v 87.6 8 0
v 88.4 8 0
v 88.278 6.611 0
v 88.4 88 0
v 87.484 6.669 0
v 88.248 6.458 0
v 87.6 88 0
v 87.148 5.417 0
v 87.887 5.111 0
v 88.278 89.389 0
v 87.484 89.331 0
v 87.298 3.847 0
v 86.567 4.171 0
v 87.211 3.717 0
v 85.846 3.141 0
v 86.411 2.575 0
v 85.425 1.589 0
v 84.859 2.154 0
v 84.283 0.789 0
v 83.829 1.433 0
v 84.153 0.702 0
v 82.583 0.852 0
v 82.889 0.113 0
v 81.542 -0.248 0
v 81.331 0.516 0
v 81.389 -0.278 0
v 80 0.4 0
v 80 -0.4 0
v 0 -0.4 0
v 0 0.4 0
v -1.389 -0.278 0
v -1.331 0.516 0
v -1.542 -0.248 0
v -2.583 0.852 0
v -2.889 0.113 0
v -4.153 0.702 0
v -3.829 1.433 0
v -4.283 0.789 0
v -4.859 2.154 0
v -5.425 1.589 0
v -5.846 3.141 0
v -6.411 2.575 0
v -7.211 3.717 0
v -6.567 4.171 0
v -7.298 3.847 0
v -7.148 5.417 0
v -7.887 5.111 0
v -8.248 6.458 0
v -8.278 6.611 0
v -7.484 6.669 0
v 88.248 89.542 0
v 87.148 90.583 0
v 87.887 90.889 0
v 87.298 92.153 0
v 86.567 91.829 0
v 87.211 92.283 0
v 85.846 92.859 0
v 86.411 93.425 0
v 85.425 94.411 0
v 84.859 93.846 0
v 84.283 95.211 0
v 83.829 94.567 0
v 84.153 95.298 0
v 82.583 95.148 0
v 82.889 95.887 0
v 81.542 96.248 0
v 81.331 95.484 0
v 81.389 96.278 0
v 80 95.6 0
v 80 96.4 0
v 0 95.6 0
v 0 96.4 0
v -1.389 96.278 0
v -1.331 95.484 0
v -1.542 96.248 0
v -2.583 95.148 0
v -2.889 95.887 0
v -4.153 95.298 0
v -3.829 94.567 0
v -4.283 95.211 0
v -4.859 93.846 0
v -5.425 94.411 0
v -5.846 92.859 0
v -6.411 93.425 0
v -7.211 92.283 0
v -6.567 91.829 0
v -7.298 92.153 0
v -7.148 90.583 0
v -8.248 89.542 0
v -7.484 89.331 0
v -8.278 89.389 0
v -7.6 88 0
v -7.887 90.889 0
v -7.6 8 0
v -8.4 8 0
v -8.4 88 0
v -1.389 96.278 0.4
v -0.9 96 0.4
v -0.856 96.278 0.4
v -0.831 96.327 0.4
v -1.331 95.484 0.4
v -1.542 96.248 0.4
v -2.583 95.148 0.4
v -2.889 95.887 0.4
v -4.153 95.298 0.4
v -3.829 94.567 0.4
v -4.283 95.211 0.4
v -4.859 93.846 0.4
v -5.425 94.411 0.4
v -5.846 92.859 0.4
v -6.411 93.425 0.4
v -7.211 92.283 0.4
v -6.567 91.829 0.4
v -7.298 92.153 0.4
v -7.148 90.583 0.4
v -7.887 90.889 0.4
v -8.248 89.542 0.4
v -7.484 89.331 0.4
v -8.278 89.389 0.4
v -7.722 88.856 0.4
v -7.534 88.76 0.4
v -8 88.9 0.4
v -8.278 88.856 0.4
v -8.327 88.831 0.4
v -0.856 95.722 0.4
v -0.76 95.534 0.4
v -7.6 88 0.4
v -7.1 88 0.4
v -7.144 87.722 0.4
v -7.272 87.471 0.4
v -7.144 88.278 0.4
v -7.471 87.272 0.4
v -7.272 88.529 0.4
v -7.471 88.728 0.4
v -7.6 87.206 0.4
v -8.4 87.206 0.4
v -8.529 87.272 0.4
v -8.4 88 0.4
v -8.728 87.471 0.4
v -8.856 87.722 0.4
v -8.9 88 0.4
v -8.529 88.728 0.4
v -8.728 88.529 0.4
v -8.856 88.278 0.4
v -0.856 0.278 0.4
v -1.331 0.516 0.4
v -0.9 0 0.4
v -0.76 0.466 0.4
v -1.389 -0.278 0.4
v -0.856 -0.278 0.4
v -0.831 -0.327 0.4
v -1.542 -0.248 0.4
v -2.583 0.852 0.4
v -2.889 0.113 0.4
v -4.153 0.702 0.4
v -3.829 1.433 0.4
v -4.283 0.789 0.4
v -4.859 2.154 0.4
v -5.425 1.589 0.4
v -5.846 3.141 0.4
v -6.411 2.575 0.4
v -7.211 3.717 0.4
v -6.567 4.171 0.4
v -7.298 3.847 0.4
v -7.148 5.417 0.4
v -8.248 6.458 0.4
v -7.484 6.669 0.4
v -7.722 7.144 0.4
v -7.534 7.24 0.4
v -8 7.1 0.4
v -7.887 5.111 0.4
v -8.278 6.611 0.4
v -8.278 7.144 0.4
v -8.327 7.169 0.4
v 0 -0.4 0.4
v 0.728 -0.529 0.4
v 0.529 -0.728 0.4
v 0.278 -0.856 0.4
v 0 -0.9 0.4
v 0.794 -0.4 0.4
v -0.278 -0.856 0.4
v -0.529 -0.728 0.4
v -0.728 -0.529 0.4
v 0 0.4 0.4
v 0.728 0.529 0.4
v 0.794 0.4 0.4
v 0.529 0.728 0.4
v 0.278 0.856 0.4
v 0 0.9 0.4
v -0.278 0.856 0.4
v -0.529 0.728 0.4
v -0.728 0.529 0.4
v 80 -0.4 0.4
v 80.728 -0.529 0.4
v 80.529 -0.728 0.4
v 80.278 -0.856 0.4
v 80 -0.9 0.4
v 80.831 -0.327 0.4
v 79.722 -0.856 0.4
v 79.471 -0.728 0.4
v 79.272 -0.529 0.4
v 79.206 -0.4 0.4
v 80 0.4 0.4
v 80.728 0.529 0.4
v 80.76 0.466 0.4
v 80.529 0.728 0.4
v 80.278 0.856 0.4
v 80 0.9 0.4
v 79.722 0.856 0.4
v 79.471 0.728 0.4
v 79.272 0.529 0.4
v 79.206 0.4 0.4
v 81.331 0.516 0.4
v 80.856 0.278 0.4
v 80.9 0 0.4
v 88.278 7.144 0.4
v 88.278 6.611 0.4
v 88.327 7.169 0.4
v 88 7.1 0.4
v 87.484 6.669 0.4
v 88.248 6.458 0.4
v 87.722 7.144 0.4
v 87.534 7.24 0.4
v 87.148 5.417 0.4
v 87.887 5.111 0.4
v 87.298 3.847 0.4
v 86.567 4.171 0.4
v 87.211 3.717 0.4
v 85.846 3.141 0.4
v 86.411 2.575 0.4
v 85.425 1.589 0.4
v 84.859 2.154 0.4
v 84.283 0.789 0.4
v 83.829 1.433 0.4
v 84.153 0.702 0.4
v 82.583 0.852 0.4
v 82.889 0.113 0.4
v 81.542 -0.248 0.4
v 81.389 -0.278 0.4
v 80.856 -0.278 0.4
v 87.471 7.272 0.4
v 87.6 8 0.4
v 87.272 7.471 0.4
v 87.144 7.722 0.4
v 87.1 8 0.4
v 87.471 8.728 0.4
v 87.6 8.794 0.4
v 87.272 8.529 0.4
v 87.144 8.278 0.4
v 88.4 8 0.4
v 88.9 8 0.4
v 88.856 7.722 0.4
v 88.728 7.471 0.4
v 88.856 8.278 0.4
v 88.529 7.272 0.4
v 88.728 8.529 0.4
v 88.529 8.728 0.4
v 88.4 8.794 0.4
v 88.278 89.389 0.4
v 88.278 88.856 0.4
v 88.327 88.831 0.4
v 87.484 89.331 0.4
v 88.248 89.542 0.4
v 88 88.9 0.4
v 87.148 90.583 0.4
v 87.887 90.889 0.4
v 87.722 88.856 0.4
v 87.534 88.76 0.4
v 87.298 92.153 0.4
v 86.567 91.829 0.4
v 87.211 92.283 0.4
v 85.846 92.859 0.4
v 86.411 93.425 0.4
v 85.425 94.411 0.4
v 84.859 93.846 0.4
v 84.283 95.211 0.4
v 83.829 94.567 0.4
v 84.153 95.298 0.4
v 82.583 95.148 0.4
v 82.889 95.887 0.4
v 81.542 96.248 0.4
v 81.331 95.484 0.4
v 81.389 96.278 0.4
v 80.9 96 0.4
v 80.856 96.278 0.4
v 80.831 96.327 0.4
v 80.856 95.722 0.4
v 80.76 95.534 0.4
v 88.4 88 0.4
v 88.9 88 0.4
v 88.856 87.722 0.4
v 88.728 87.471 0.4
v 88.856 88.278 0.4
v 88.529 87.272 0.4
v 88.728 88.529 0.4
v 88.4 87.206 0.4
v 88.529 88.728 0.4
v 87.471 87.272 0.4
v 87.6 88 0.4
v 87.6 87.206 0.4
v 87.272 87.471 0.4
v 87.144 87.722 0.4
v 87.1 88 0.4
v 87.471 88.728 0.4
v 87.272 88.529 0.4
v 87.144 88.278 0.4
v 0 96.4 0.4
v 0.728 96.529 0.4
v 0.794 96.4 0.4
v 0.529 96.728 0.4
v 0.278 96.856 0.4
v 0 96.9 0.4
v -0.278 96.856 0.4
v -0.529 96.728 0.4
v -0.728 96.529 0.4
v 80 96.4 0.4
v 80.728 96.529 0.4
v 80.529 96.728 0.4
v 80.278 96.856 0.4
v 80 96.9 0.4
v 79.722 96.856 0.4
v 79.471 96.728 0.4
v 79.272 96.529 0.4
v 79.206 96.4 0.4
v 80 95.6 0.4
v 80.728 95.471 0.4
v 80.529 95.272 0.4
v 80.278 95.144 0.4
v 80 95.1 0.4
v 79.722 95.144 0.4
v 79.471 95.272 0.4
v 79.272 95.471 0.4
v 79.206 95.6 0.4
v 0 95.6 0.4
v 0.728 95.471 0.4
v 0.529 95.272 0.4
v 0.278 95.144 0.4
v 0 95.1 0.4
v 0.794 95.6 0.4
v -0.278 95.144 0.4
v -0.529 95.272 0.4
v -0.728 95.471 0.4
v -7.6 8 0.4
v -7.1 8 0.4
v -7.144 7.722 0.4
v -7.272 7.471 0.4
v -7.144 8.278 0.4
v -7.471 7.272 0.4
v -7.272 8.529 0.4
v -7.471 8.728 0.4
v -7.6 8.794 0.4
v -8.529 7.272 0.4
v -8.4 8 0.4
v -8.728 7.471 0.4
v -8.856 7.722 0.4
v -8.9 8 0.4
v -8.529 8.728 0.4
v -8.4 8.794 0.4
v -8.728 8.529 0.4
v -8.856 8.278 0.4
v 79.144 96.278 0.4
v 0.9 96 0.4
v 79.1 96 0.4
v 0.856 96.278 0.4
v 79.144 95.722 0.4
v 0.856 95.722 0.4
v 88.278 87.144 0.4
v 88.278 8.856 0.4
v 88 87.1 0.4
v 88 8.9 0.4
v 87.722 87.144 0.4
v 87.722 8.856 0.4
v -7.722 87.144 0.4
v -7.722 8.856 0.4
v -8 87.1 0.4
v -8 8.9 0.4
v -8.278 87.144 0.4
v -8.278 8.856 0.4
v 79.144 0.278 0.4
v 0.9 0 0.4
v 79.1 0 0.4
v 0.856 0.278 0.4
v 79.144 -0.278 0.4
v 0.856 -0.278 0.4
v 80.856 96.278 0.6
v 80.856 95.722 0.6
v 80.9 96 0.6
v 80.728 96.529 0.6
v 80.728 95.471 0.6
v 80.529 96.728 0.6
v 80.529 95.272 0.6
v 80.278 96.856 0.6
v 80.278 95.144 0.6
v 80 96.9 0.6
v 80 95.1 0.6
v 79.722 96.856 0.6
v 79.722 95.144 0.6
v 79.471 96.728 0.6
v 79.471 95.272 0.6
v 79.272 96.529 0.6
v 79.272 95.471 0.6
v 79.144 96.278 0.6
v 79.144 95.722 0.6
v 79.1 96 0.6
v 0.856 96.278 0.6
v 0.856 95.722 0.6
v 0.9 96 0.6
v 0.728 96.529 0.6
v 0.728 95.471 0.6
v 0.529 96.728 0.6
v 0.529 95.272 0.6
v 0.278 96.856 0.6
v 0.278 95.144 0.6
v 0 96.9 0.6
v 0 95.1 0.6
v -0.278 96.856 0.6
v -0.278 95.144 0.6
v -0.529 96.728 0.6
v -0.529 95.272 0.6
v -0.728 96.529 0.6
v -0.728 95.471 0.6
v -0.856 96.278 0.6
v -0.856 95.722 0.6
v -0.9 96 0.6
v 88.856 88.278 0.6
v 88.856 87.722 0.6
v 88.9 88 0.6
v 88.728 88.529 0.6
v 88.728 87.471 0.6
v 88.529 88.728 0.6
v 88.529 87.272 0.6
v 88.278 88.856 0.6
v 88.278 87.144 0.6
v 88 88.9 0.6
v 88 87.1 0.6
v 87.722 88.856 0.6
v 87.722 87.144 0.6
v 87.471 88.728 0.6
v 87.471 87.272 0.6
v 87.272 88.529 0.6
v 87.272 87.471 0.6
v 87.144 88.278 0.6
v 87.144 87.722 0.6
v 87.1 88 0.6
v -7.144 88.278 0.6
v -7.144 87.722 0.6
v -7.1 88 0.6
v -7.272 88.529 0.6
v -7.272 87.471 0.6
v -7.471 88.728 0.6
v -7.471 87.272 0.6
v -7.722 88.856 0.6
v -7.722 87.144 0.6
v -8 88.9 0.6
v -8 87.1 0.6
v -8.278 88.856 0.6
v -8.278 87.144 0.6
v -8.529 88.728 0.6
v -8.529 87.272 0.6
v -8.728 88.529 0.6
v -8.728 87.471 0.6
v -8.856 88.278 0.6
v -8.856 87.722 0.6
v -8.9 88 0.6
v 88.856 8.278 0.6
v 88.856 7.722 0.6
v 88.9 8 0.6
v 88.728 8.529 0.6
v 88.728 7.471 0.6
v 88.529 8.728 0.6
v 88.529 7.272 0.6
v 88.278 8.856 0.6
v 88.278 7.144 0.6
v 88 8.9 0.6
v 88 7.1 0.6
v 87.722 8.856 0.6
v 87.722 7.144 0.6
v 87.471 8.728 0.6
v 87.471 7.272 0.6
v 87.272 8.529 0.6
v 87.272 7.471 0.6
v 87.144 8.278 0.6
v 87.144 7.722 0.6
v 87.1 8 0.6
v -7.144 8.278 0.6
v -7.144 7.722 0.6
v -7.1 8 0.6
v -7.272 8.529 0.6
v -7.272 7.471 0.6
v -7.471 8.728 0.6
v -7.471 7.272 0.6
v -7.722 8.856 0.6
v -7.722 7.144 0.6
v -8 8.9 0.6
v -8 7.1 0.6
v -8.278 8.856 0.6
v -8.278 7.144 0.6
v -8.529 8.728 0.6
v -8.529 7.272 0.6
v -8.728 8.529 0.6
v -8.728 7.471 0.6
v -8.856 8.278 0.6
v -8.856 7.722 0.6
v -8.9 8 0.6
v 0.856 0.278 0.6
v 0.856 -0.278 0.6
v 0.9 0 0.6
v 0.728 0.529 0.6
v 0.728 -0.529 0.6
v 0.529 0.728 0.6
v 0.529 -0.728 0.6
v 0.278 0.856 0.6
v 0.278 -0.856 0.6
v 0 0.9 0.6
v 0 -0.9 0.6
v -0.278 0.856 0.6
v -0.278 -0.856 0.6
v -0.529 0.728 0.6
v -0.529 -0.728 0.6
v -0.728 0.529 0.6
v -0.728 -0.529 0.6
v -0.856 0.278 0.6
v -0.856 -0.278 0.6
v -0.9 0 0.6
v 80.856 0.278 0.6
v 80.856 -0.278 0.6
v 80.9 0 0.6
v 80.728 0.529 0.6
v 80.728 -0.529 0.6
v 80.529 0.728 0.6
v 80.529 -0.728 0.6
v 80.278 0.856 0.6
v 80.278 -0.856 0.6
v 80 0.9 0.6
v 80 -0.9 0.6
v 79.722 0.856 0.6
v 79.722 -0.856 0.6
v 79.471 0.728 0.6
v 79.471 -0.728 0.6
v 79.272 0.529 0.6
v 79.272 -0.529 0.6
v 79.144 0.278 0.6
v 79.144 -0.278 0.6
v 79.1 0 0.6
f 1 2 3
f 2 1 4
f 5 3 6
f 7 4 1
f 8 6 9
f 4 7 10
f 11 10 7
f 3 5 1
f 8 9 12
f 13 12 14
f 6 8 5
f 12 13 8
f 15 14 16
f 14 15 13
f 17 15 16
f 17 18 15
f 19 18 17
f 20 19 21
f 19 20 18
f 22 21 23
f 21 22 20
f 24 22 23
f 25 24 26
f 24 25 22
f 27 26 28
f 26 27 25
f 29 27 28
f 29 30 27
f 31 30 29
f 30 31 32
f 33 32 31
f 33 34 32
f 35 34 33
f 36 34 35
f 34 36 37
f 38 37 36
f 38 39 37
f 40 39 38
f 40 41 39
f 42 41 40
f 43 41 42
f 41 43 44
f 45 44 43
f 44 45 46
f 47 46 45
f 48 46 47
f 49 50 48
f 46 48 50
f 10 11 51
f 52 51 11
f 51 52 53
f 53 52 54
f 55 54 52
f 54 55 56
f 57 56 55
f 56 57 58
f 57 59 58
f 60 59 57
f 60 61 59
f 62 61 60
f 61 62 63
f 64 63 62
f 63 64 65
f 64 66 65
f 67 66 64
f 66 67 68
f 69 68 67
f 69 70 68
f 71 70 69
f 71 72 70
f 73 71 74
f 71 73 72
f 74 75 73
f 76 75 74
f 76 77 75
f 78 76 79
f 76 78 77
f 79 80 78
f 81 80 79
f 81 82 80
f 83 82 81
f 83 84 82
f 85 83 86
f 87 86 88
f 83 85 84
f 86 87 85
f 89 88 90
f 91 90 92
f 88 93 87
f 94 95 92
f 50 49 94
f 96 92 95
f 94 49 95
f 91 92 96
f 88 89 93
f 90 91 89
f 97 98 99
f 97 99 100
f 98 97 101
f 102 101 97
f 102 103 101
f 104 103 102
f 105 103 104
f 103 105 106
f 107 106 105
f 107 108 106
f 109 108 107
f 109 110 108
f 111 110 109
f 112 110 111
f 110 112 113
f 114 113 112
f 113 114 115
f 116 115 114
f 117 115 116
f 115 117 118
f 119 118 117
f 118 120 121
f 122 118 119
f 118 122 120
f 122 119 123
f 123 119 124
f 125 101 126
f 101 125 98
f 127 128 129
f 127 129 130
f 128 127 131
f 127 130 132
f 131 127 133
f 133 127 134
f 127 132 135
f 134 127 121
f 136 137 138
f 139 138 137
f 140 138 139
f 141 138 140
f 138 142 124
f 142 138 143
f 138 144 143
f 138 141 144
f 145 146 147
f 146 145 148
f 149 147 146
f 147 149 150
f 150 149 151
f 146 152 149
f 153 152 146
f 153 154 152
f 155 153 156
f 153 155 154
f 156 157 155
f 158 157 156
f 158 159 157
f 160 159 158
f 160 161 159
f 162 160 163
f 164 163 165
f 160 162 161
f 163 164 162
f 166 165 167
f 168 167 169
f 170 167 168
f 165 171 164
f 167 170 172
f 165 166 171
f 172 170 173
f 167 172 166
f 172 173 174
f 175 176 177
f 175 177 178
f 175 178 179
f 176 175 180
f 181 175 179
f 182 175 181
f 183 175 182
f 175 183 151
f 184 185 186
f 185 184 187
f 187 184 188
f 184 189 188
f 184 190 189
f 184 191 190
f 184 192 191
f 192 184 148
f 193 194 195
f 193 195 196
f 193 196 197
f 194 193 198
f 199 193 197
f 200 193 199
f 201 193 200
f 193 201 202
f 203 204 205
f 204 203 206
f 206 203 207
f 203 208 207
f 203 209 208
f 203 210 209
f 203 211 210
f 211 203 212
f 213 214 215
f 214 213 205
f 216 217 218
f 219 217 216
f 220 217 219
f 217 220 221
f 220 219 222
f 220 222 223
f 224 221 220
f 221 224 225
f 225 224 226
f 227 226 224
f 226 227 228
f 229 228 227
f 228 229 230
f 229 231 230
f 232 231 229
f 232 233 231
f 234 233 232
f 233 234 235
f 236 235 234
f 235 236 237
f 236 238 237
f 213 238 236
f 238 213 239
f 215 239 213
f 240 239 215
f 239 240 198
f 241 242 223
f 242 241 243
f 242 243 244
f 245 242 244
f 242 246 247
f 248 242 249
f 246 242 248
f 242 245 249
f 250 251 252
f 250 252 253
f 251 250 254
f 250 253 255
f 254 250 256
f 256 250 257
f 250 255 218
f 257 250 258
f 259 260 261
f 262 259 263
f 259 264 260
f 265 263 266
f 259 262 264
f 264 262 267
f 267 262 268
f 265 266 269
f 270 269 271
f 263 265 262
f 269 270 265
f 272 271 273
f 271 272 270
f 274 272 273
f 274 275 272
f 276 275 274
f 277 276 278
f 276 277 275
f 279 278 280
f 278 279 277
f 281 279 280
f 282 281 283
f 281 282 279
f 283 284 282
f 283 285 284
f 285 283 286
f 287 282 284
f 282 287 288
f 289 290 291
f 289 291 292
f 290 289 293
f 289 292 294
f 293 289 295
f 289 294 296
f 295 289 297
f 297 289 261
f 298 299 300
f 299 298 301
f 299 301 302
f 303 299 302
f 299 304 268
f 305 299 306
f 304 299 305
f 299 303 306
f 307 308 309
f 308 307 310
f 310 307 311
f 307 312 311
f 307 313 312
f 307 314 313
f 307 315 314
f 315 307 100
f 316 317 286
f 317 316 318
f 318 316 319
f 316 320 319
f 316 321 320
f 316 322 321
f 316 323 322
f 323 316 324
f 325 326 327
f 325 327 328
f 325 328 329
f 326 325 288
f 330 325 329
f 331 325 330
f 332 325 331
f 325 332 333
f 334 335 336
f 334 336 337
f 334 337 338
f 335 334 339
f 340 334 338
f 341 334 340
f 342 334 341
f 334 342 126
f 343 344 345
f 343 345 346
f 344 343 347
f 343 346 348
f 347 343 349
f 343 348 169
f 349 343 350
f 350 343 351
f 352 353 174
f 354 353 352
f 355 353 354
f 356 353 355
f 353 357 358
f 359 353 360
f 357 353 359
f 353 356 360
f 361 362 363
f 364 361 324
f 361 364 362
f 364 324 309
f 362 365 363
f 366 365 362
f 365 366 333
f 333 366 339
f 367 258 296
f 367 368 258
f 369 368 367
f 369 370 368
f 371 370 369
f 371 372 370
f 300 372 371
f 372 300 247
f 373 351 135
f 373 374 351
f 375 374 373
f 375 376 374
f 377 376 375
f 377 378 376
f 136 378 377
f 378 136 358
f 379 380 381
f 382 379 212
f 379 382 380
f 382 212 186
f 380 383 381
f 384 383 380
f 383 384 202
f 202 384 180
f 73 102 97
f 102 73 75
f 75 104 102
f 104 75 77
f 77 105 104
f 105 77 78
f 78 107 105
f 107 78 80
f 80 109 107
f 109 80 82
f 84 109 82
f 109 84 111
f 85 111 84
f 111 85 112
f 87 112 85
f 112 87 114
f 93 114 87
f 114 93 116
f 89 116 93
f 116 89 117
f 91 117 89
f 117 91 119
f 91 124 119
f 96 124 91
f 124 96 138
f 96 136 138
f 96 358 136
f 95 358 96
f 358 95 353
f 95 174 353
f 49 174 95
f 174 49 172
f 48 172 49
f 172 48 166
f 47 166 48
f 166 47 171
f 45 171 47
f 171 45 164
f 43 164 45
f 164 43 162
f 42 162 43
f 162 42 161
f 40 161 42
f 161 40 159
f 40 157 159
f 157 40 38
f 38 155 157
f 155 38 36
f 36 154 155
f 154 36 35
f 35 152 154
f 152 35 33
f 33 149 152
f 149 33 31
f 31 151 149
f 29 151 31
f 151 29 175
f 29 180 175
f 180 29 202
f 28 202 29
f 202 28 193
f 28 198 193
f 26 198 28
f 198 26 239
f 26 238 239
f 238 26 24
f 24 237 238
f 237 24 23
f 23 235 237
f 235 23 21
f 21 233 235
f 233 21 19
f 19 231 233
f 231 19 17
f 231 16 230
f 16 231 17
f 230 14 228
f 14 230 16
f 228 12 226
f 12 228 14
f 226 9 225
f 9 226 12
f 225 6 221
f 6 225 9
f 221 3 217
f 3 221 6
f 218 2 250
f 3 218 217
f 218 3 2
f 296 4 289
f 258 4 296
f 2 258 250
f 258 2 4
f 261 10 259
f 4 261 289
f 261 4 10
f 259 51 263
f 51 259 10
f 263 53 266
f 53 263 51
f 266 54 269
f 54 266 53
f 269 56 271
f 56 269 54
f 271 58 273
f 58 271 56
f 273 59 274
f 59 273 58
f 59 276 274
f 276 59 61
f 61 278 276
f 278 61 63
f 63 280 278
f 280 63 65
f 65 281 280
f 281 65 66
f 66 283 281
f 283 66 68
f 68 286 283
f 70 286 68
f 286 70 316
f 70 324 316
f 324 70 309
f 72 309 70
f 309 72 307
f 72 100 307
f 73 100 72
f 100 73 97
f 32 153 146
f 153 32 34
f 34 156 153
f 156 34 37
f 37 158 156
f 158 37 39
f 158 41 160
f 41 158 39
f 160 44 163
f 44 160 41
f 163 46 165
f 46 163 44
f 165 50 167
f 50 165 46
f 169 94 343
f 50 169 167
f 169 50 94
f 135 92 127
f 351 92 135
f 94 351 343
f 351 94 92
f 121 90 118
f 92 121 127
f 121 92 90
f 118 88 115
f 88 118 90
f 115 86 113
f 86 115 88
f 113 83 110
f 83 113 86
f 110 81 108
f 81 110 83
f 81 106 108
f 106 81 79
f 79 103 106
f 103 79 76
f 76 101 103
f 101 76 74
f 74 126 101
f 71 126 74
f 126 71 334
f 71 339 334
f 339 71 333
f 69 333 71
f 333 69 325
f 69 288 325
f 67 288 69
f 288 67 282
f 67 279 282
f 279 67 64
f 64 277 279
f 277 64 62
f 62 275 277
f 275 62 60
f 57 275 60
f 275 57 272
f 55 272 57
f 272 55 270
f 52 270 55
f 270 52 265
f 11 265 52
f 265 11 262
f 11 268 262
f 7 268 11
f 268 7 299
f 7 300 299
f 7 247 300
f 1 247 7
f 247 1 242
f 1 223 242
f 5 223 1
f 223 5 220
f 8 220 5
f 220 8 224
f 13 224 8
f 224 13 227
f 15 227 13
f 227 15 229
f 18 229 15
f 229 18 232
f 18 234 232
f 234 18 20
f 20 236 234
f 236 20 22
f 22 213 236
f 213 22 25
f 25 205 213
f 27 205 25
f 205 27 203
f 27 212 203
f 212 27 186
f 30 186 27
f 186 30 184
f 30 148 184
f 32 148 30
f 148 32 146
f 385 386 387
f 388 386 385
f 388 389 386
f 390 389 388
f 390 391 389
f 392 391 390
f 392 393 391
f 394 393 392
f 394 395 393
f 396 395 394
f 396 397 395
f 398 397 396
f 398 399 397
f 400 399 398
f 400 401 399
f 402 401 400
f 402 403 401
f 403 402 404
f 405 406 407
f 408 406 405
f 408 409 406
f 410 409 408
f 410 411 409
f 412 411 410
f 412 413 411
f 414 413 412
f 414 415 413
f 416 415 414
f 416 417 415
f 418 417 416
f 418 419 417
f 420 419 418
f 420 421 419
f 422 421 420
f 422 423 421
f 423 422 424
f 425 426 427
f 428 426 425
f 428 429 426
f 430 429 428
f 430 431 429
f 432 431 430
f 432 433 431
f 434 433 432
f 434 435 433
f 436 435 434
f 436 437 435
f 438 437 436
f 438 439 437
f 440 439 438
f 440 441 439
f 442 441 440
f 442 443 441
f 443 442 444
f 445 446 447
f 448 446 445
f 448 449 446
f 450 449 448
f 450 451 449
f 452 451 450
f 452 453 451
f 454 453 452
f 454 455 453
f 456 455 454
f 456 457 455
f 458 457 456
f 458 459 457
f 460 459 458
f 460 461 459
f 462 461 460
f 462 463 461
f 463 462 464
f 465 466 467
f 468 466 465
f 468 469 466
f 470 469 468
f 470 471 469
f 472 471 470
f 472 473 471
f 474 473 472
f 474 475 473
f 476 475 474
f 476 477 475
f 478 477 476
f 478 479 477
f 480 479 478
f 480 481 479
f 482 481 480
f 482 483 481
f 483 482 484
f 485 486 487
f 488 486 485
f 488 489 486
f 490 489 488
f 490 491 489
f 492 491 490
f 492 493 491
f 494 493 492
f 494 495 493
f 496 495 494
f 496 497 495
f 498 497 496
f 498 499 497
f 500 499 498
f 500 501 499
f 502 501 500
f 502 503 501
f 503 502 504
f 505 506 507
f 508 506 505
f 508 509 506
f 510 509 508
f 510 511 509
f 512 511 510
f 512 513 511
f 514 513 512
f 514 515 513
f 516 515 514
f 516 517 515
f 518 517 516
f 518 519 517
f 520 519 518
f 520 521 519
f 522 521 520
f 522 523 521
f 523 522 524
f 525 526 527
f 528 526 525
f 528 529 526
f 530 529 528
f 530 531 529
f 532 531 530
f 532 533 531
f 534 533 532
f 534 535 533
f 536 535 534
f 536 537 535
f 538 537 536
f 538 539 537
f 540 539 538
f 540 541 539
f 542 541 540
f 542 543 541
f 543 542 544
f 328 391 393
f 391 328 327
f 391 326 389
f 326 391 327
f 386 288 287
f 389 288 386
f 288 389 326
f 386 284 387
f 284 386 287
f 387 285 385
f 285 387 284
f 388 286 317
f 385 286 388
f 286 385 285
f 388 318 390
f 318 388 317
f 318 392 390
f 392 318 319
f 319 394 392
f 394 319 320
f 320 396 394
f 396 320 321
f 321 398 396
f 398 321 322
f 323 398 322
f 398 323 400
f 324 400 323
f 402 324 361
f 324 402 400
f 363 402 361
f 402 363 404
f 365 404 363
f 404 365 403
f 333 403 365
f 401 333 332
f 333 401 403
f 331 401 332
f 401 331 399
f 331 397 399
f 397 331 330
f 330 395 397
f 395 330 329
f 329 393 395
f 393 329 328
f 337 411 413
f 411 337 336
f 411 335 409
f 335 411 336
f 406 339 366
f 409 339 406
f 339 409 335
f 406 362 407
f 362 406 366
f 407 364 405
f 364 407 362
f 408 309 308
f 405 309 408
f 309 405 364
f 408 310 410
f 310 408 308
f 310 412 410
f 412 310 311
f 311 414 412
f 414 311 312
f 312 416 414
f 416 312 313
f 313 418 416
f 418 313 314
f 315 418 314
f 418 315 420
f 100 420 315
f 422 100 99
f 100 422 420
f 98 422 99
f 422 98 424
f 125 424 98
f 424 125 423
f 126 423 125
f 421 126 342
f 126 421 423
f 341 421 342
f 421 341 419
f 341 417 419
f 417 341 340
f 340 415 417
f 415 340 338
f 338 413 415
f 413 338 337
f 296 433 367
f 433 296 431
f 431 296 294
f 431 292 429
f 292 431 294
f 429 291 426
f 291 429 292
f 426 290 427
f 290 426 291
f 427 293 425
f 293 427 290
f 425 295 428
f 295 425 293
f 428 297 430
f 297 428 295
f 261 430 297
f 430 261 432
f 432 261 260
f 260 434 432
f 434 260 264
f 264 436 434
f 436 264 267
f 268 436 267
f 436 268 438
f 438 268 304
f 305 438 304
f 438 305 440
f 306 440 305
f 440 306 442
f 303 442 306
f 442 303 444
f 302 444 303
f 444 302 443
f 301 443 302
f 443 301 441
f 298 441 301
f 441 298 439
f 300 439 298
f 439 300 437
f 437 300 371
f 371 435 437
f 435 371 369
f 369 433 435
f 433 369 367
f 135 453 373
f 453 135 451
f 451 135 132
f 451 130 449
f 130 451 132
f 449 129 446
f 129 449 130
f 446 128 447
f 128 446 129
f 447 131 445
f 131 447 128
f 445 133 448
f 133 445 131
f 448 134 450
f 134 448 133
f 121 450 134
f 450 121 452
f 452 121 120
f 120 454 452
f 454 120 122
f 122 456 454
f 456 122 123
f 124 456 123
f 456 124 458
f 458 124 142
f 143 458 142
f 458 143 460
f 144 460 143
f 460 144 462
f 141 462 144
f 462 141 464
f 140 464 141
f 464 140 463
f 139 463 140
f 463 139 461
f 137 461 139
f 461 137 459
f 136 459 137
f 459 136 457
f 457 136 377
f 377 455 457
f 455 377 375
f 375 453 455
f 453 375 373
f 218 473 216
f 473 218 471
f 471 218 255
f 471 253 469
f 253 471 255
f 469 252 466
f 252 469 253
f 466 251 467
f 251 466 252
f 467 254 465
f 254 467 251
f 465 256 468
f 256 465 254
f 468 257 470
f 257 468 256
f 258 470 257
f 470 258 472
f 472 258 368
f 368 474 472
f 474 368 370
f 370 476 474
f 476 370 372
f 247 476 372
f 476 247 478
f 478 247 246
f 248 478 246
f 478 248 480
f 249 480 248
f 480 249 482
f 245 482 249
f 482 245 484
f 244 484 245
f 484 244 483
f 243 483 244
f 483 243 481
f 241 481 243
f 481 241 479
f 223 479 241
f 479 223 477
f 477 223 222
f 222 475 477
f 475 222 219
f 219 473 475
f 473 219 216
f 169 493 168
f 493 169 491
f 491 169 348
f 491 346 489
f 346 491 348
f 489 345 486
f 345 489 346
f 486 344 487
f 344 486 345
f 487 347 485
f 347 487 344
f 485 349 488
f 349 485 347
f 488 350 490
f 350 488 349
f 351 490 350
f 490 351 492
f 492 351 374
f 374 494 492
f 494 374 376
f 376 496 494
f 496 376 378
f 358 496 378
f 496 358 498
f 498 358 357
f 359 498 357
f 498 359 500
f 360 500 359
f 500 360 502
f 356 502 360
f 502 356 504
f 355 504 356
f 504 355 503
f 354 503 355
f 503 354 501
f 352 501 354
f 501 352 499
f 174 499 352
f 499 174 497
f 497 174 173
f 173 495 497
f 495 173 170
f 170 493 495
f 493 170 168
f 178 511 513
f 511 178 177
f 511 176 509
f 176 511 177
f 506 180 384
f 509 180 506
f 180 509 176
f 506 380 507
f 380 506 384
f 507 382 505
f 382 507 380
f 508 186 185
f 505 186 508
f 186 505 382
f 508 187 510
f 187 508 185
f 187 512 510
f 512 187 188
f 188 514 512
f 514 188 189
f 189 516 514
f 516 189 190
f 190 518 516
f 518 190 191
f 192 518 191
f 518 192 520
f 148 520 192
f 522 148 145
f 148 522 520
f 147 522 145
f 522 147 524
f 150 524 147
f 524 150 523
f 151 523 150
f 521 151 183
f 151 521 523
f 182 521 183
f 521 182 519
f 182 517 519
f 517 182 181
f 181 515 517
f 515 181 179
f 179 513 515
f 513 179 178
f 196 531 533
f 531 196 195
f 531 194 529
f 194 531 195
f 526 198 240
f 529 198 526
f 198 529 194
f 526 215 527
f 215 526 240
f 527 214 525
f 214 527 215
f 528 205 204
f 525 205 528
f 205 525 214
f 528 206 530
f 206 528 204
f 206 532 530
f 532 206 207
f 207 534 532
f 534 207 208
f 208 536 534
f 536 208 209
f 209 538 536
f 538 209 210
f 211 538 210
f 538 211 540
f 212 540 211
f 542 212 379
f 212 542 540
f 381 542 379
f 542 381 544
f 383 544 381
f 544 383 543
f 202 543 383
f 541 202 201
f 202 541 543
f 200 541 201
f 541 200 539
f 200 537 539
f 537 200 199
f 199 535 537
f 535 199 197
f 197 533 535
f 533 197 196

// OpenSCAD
// file: ../geometry/diagnostic_path.scad
//////////////////////////////////////////////////////////////////////
// LibFile: diagnostic_path.scad
// Project: Strap Bender
// FileGroup: Diagnostic Geometry
// FileSummary: Renders a sampled analytical reference path and tangencies.
//////////////////////////////////////////////////////////////////////

module sb_diagnostic_polyline_2d(points, path_width_mm) {
    for (segment_index = [0 : len(points) - 2])
        hull() {
            translate(points[segment_index])
                circle(d = path_width_mm, $fn = 16);
            translate(points[segment_index + 1])
                circle(d = path_width_mm, $fn = 16);
        }
}

module sb_diagnostic_tangent_markers_2d(path, marker_diameter_mm) {
    primitives = analytical_path_primitives(path);

    for (primitive = primitives)
        translate(sb_pose_point(primitive_start_pose(primitive)))
            circle(d = marker_diameter_mm, $fn = 20);

    translate(sb_pose_point(analytical_path_end_pose(path)))
        circle(d = marker_diameter_mm, $fn = 20);
}

module render_diagnostic_path(
    analytical_path,
    sampled_path,
    path_width_mm = 0.8,
    path_height_mm = 0.4,
    show_tangent_points = true,
    tangent_marker_diameter_mm = 1.6
) {
    assert(sb_finite_number(path_width_mm) && path_width_mm > 0,
        "Diagnostic path width must be finite and greater than zero.");
    assert(sb_finite_number(path_height_mm) && path_height_mm > 0,
        "Diagnostic path height must be finite and greater than zero.");
    assert(show_tangent_points == true || show_tangent_points == false,
        "Diagnostic tangent-point visibility must be Boolean.");
    assert(sb_finite_number(tangent_marker_diameter_mm) &&
        tangent_marker_diameter_mm > 0,
        "Diagnostic tangent marker diameter must be positive.");

    points = sampled_path_points(sampled_path);

    linear_extrude(height = path_height_mm)
        sb_diagnostic_polyline_2d(points, path_width_mm);

    if (show_tangent_points)
        translate([0, 0, path_height_mm])
            linear_extrude(height = path_height_mm / 2)
                sb_diagnostic_tangent_markers_2d(
                    analytical_path,
                    tangent_marker_diameter_mm
                );
}
// file: ../lib/reporting.scad
//////////////////////////////////////////////////////////////////////
// LibFile: reporting.scad
// Project: Strap Bender
// FileGroup: Reporting
// FileSummary: Reports source records and derived analytical paths.
//////////////////////////////////////////////////////////////////////

module report_project(project, report_level = "full") {
    echo("--- Strap Bender project ---");
    echo(str("Name: ", project_name(project)));
    echo(str("Kind: ", project_kind(project)));
    echo(str("Status: ", project_status(project)));

    if (report_level == "full")
        echo(str("Notes: ", project_notes(project)));
}

module report_start_pose(pose, prefix = "Start pose") {
    echo(str(
        prefix, ": [",
        pose_x(pose), ", ", pose_y(pose),
        "] heading ", pose_heading_degrees(pose), " degrees"
    ));
}

module report_bend_program_command(command) {
    if (command_kind(command) == "straight")
        echo(str(
            "Command ", command_source_index(command),
            ": straight ", command_distance(command), " mm",
            len(command_label(command)) > 0
                ? str(" [", command_label(command), "]") : ""
        ));
    else
        echo(str(
            "Command ", command_source_index(command),
            ": bend ", command_angle_degrees(command),
            " degrees at finished inside radius ",
            command_inside_radius(command), " mm",
            len(command_label(command)) > 0
                ? str(" [", command_label(command), "]") : ""
        ));
}

module report_bend_program_shape(shape, report_level = "full") {
    commands = shape_commands(shape);
    straight_count = len([
        for (command = commands)
            if (command_kind(command) == "straight") command
    ]);
    bend_count = len(commands) - straight_count;

    echo("--- Strap Bender bend program ---");
    echo(str("Shape: ", shape_name(shape)));
    echo(str("Closure: ", shape_closure(shape)));
    echo(str("Commands: ", len(commands),
        " (", straight_count, " straight, ", bend_count, " bend)"));
    report_start_pose(shape_start_pose(shape));

    if (report_level == "full") {
        for (command = commands)
            report_bend_program_command(command);
        echo(str("Notes: ", shape_notes(shape)));
    }
}

module report_analytical_primitive(primitive) {
    start_pose = primitive_start_pose(primitive);
    end_pose = primitive_end_pose(primitive);

    if (primitive_kind(primitive) == "line")
        echo(str(
            "Primitive from command ", primitive_source_index(primitive),
            ": line, station ", primitive_station_start(primitive),
            " to ", primitive_station_end(primitive),
            " mm, [", pose_x(start_pose), ", ", pose_y(start_pose),
            "] to [", pose_x(end_pose), ", ", pose_y(end_pose), "]",
            len(primitive_label(primitive)) > 0
                ? str(" [", primitive_label(primitive), "]") : ""
        ));
    else
        echo(str(
            "Primitive from command ", primitive_source_index(primitive),
            ": arc ", primitive_angle_degrees(primitive),
            " degrees at inside radius ",
            primitive_inside_radius(primitive),
            " mm, center [", sb_point_x(primitive_center(primitive)),
            ", ", sb_point_y(primitive_center(primitive)),
            "], station ", primitive_station_start(primitive),
            " to ", primitive_station_end(primitive), " mm",
            len(primitive_label(primitive)) > 0
                ? str(" [", primitive_label(primitive), "]") : ""
        ));
}

module report_analytical_path(path, report_level = "full") {
    primitives = analytical_path_primitives(path);
    line_count = len([
        for (primitive = primitives)
            if (primitive_kind(primitive) == "line") primitive
    ]);
    arc_count = len(primitives) - line_count;
    bounds = analytical_path_bounds(path);

    echo("--- Strap Bender analytical path ---");
    echo(str("Path: ", analytical_path_name(path)));
    echo(str("Reference axis: ", analytical_path_reference_axis(path)));
    echo(str("Primitives: ", len(primitives),
        " (", line_count, " line, ", arc_count, " arc)"));
    echo(str("Total straight length: ",
        analytical_path_straight_length(path), " mm"));
    echo(str("Total inside-edge arc length: ",
        analytical_path_arc_length(path), " mm"));
    echo(str("Total inside-reference path length: ",
        analytical_path_length(path), " mm"));
    report_start_pose(analytical_path_end_pose(path), "End pose");
    echo(str(
        "Bounds: [", sb_bounds_min_x(bounds), ", ",
        sb_bounds_min_y(bounds), "] to [",
        sb_bounds_max_x(bounds), ", ",
        sb_bounds_max_y(bounds), "] mm"
    ));

    if (analytical_path_closure(path) == "closed") {
        echo(str("Closure position error: ",
            analytical_path_closure_position_error(path), " mm"));
        echo(str("Closure heading error: ",
            analytical_path_closure_angle_error(path), " degrees"));
    }

    echo(str(
        "Length warning: the inside-reference path length is not a ",
        "neutral-axis developed length or a cut length."
    ));

    if (report_level == "full") {
        for (primitive = primitives)
            report_analytical_primitive(primitive);
        echo(str("Notes: ", analytical_path_notes(path)));
    }
}

module report_sampled_path(
    sampled_path,
    analytical_path,
    report_level = "summary"
) {
    points = sampled_path_points(sampled_path);
    polyline_length = sampled_path_polyline_length(sampled_path);
    analytical_length = analytical_path_length(analytical_path);

    echo("--- Strap Bender sampled display path ---");
    echo(str("Path: ", sampled_path_name(sampled_path)));
    echo(str("Reference axis: ",
        sampled_path_reference_axis(sampled_path)));
    echo(str("Sample points: ", len(points)));
    echo(str("Requested maximum chord error: ",
        sampled_path_chord_error_mm(sampled_path), " mm"));
    echo(str("Maximum angular step: ",
        sampled_path_max_angle_step_degrees(sampled_path), " degrees"));
    echo(str("Display polyline length: ", polyline_length, " mm"));
    echo(str("Exact analytical reference length: ",
        analytical_length, " mm"));
    echo(str("Chordal length shortfall: ",
        analytical_length - polyline_length, " mm"));
    echo(str(
        "Sampling warning: sampled points are display data only and may not ",
        "replace exact analytical measurements, bounds, stations, or datums."
    ));

    if (report_level == "full")
        echo(str("Notes: ", sampled_path_notes(sampled_path)));
}
// file: ../paths/sample_analytical_path.scad
//////////////////////////////////////////////////////////////////////
// LibFile: sample_analytical_path.scad
// Project: Strap Bender
// FileGroup: Analytical Path Consumer
// FileSummary: Samples exact line and arc primitives for display only.
//////////////////////////////////////////////////////////////////////

SB_DEFAULT_SAMPLE_CHORD_ERROR_MM = 0.05;
SB_DEFAULT_SAMPLE_MAX_ANGLE_STEP_DEGREES = 10;
SB_MAX_SAMPLED_PATH_POINTS = 100000;

function sb_sampling_chord_error_valid(value) =
    sb_finite_number(value) && value > 0;

function sb_sampling_max_angle_step_valid(value) =
    sb_finite_number(value) && value > 0 && value <= 180;

function sb_arc_chord_angle_limit_degrees(radius, chord_error_mm) =
    chord_error_mm >= radius
        ? 180
        : max(
            SB_NUMERIC_ANGLE_TOLERANCE_DEGREES,
            2 * acos(1 - chord_error_mm / radius)
        );

function sb_arc_sample_count(
    primitive,
    chord_error_mm = SB_DEFAULT_SAMPLE_CHORD_ERROR_MM,
    max_angle_step_degrees = SB_DEFAULT_SAMPLE_MAX_ANGLE_STEP_DEGREES
) =
    assert(sb_sampling_chord_error_valid(chord_error_mm),
        "Sampling chord error must be finite and greater than zero.")
    assert(sb_sampling_max_angle_step_valid(max_angle_step_degrees),
        "Sampling maximum angular step must be within (0, 180].")
    let(
        chord_limit = sb_arc_chord_angle_limit_degrees(
            primitive_inside_radius(primitive),
            chord_error_mm
        ),
        step_limit = min(chord_limit, max_angle_step_degrees)
    )
    max(1, ceil(abs(primitive_angle_degrees(primitive)) / step_limit));

function sb_arc_sample_sagitta_mm(primitive, sample_count) =
    primitive_inside_radius(primitive) *
    (1 - cos(
        abs(primitive_angle_degrees(primitive)) /
        (2 * sample_count)
    ));

function sb_sample_analytical_primitive_points(
    primitive,
    chord_error_mm = SB_DEFAULT_SAMPLE_CHORD_ERROR_MM,
    max_angle_step_degrees = SB_DEFAULT_SAMPLE_MAX_ANGLE_STEP_DEGREES,
    include_start = true
) =
    primitive_kind(primitive) == "line"
        ? include_start
            ? [
                sb_pose_point(primitive_start_pose(primitive)),
                sb_pose_point(primitive_end_pose(primitive))
            ]
            : [sb_pose_point(primitive_end_pose(primitive))]
        : let(
            sample_count = sb_arc_sample_count(
                primitive,
                chord_error_mm,
                max_angle_step_degrees
            ),
            first_index = include_start ? 0 : 1,
            start_point = sb_pose_point(primitive_start_pose(primitive)),
            end_point = sb_pose_point(primitive_end_pose(primitive)),
            center = primitive_center(primitive),
            sweep = primitive_angle_degrees(primitive)
        )
        [
            for (sample_index = [first_index : sample_count])
                sample_index == 0
                    ? start_point
                    : sample_index == sample_count
                        ? end_point
                        : sb_rotate_point_about(
                            start_point,
                            center,
                            sweep * sample_index / sample_count
                        )
        ];

function sb_sample_analytical_path_points(
    path,
    chord_error_mm = SB_DEFAULT_SAMPLE_CHORD_ERROR_MM,
    max_angle_step_degrees = SB_DEFAULT_SAMPLE_MAX_ANGLE_STEP_DEGREES
) =
    let(primitives = analytical_path_primitives(path))
    [
        for (primitive_index = [0 : len(primitives) - 1])
            each sb_sample_analytical_primitive_points(
                primitives[primitive_index],
                chord_error_mm,
                max_angle_step_degrees,
                primitive_index == 0
            )
    ];

function sb_sampled_path_point_count(
    path,
    chord_error_mm = SB_DEFAULT_SAMPLE_CHORD_ERROR_MM,
    max_angle_step_degrees = SB_DEFAULT_SAMPLE_MAX_ANGLE_STEP_DEGREES
) =
    1 + sb_list_sum([
        for (primitive = analytical_path_primitives(path))
            primitive_kind(primitive) == "line"
                ? 1
                : sb_arc_sample_count(
                    primitive,
                    chord_error_mm,
                    max_angle_step_degrees
                )
    ]);

function sample_analytical_path(
    path,
    chord_error_mm = SB_DEFAULT_SAMPLE_CHORD_ERROR_MM,
    max_angle_step_degrees = SB_DEFAULT_SAMPLE_MAX_ANGLE_STEP_DEGREES
) =
    assert(sb_sampling_chord_error_valid(chord_error_mm),
        "Sampling chord error must be finite and greater than zero.")
    assert(sb_sampling_max_angle_step_valid(max_angle_step_degrees),
        "Sampling maximum angular step must be within (0, 180].")
    assert(sb_sampled_path_point_count(
        path,
        chord_error_mm,
        max_angle_step_degrees
    ) <= SB_MAX_SAMPLED_PATH_POINTS,
        str("Sampling request exceeds the supported point limit of ",
            SB_MAX_SAMPLED_PATH_POINTS, "."))
    sampled_path_spec(
        name = analytical_path_name(path),
        reference_axis = analytical_path_reference_axis(path),
        closure = analytical_path_closure(path),
        points = sb_sample_analytical_path_points(
            path,
            chord_error_mm,
            max_angle_step_degrees
        ),
        chord_error_mm = chord_error_mm,
        max_angle_step_degrees = max_angle_step_degrees,
        notes = str(
            "Derived display polyline only. Exact measurements, bounds, ",
            "stations, and fixture datums remain properties of the analytical ",
            "line-and-arc path."
        )
    );

function sampled_path_polyline_length(path) =
    let(points = sampled_path_points(path))
    sb_list_sum([
        for (point_index = [0 : len(points) - 2])
            sb_point_distance(
                points[point_index],
                points[point_index + 1]
            )
    ]);

function sampled_path_bounds(path) =
    sb_bounds_from_points(sampled_path_points(path));
// file: ../paths/compile_bend_program.scad
//////////////////////////////////////////////////////////////////////
// LibFile: compile_bend_program.scad
// Project: Strap Bender
// FileGroup: Analytical Path Kernel
// FileSummary: Compiles explicit bend commands to exact line and arc records.
//////////////////////////////////////////////////////////////////////

function sb_compile_command(command, start_pose, station_start) =
    command_kind(command) == "straight"
        ? let(
            end_pose = sb_advance_straight_pose(
                start_pose,
                command_distance(command)
            ),
            station_end = station_start + command_distance(command)
        )
        analytical_line_primitive(
            source_index = command_source_index(command),
            label = command_label(command),
            start_pose = start_pose,
            end_pose = end_pose,
            station_start = station_start,
            station_end = station_end
        )
        : let(
            center = sb_bend_center(
                start_pose,
                command_angle_degrees(command),
                command_inside_radius(command)
            ),
            end_pose = sb_advance_bend_pose(
                start_pose,
                command_angle_degrees(command),
                command_inside_radius(command)
            ),
            station_end = station_start + sb_arc_length(
                command_inside_radius(command),
                command_angle_degrees(command)
            )
        )
        analytical_arc_primitive(
            source_index = command_source_index(command),
            label = command_label(command),
            start_pose = start_pose,
            end_pose = end_pose,
            station_start = station_start,
            station_end = station_end,
            center = center,
            angle_degrees = command_angle_degrees(command),
            inside_radius = command_inside_radius(command)
        );

function sb_compile_command_sequence(
    commands,
    command_index,
    current_pose,
    current_station
) =
    command_index >= len(commands)
        ? []
        : let(
            primitive = sb_compile_command(
                commands[command_index],
                current_pose,
                current_station
            ),
            remaining = sb_compile_command_sequence(
                commands,
                command_index + 1,
                primitive_end_pose(primitive),
                primitive_station_end(primitive)
            )
        )
        concat([primitive], remaining);

function compile_bend_program(shape) =
    let(
        primitives = sb_compile_command_sequence(
            shape_commands(shape),
            0,
            shape_start_pose(shape),
            0
        ),
        end_pose = primitive_end_pose(primitives[len(primitives) - 1]),
        bounds = sb_analytical_path_bounds_from_primitives(primitives)
    )
    analytical_path_spec(
        name = shape_name(shape),
        reference_axis = "finished_inside_edge",
        closure = shape_closure(shape),
        start_pose = shape_start_pose(shape),
        end_pose = end_pose,
        primitives = primitives,
        bounds = bounds,
        notes = str(
            "Derived from explicit bend-program commands. Stations and arc ",
            "lengths use the finished inside edge. This is not a neutral-axis ",
            "developed length or a cut length."
        )
    );

function analytical_path_straight_length(path) =
    sb_list_sum([
        for (primitive = analytical_path_primitives(path))
            if (primitive_kind(primitive) == "line")
                primitive_length(primitive)
    ]);

function analytical_path_arc_length(path) =
    sb_list_sum([
        for (primitive = analytical_path_primitives(path))
            if (primitive_kind(primitive) == "arc")
                primitive_length(primitive)
    ]);
// file: ../paths/analytical_bounds.scad
//////////////////////////////////////////////////////////////////////
// LibFile: analytical_bounds.scad
// Project: Strap Bender
// FileGroup: Analytical Path Kernel
// FileSummary: Calculates exact line and circular-arc XY bounds.
//////////////////////////////////////////////////////////////////////

function sb_bounds_from_points(points) = [
    min([for (point = points) sb_point_x(point)]),
    min([for (point = points) sb_point_y(point)]),
    max([for (point = points) sb_point_x(point)]),
    max([for (point = points) sb_point_y(point)])
];

function sb_bounds_union(bounds_list) = [
    min([for (bounds = bounds_list) sb_bounds_min_x(bounds)]),
    min([for (bounds = bounds_list) sb_bounds_min_y(bounds)]),
    max([for (bounds = bounds_list) sb_bounds_max_x(bounds)]),
    max([for (bounds = bounds_list) sb_bounds_max_y(bounds)])
];

function sb_angle_is_on_sweep(
    candidate_degrees,
    start_degrees,
    sweep_degrees,
    tolerance = SB_NUMERIC_ANGLE_TOLERANCE_DEGREES
) =
    sweep_degrees > 0
        ? sb_positive_mod(candidate_degrees - start_degrees, 360)
            <= sweep_degrees + tolerance
        : sb_positive_mod(start_degrees - candidate_degrees, 360)
            <= -sweep_degrees + tolerance;

function sb_arc_start_radial_angle(primitive) =
    pose_heading_degrees(primitive_start_pose(primitive)) +
    (primitive_angle_degrees(primitive) > 0 ? -90 : 90);

function sb_arc_cardinal_points(primitive) =
    let(
        center = primitive_center(primitive),
        radius = primitive_inside_radius(primitive),
        start_angle = sb_arc_start_radial_angle(primitive),
        sweep = primitive_angle_degrees(primitive)
    )
    [
        for (candidate = [0, 90, 180, 270])
            if (sb_angle_is_on_sweep(candidate, start_angle, sweep))
                [
                    sb_point_x(center) + radius * cos(candidate),
                    sb_point_y(center) + radius * sin(candidate)
                ]
    ];

function analytical_primitive_bounds(primitive) =
    primitive_kind(primitive) == "line"
        ? sb_bounds_from_points([
            sb_pose_point(primitive_start_pose(primitive)),
            sb_pose_point(primitive_end_pose(primitive))
        ])
        : sb_bounds_from_points(concat(
            [
                sb_pose_point(primitive_start_pose(primitive)),
                sb_pose_point(primitive_end_pose(primitive))
            ],
            sb_arc_cardinal_points(primitive)
        ));

function sb_analytical_path_bounds_from_primitives(primitives) =
    sb_bounds_union([
        for (primitive = primitives)
            analytical_primitive_bounds(primitive)
    ]);
// file: ../paths/analytical_math.scad
//////////////////////////////////////////////////////////////////////
// LibFile: analytical_math.scad
// Project: Strap Bender
// FileGroup: Analytical Path Kernel
// FileSummary: Deterministic planar pose, angle, and station mathematics.
//////////////////////////////////////////////////////////////////////

SB_PI = 3.14159265358979323846;
SB_NUMERIC_POSITION_TOLERANCE_MM = 0.0000001;
SB_NUMERIC_STATION_TOLERANCE_MM = 0.0000001;
SB_NUMERIC_ANGLE_TOLERANCE_DEGREES = 0.0000001;
SB_CLOSURE_POSITION_TOLERANCE_MM = 0.001;
SB_CLOSURE_ANGLE_TOLERANCE_DEGREES = 0.001;

function sb_point_x(point) = point[0];
function sb_point_y(point) = point[1];
function sb_pose_point(pose) = [pose_x(pose), pose_y(pose)];

function sb_degrees_to_radians(angle_degrees) =
    angle_degrees * SB_PI / 180;

function sb_point_distance(first, second) =
    sqrt(
        pow(sb_point_x(second) - sb_point_x(first), 2) +
        pow(sb_point_y(second) - sb_point_y(first), 2)
    );

function sb_pose_position_distance(first, second) =
    sb_point_distance(sb_pose_point(first), sb_pose_point(second));

function sb_positive_mod(value, modulus = 360) =
    ((value % modulus) + modulus) % modulus;

function sb_normalized_heading_degrees(angle_degrees) =
    sb_positive_mod(angle_degrees, 360);

function sb_smallest_angle_delta_degrees(first, second) =
    let(delta = sb_positive_mod(second - first + 180, 360) - 180)
    abs(delta);

function sb_near(first, second, tolerance) =
    abs(first - second) <= tolerance;

function sb_pose_near(
    first,
    second,
    position_tolerance = SB_NUMERIC_POSITION_TOLERANCE_MM,
    angle_tolerance = SB_NUMERIC_ANGLE_TOLERANCE_DEGREES
) =
    sb_pose_position_distance(first, second) <= position_tolerance &&
    sb_smallest_angle_delta_degrees(
        pose_heading_degrees(first),
        pose_heading_degrees(second)
    ) <= angle_tolerance;

function sb_advance_straight_pose(pose, distance) =
    start_pose_spec(
        x = pose_x(pose) +
            distance * cos(pose_heading_degrees(pose)),
        y = pose_y(pose) +
            distance * sin(pose_heading_degrees(pose)),
        heading_degrees = pose_heading_degrees(pose)
    );

function sb_bend_turn_sign(angle_degrees) =
    angle_degrees > 0 ? 1 : -1;

function sb_bend_center(start_pose, angle_degrees, radius) =
    let(
        turn_sign = sb_bend_turn_sign(angle_degrees),
        heading = pose_heading_degrees(start_pose)
    )
    [
        pose_x(start_pose) - turn_sign * radius * sin(heading),
        pose_y(start_pose) + turn_sign * radius * cos(heading)
    ];

function sb_rotate_point_about(point, center, angle_degrees) =
    let(
        relative_x = sb_point_x(point) - sb_point_x(center),
        relative_y = sb_point_y(point) - sb_point_y(center)
    )
    [
        sb_point_x(center) +
            relative_x * cos(angle_degrees) -
            relative_y * sin(angle_degrees),
        sb_point_y(center) +
            relative_x * sin(angle_degrees) +
            relative_y * cos(angle_degrees)
    ];

function sb_advance_bend_pose(start_pose, angle_degrees, radius) =
    let(
        center = sb_bend_center(start_pose, angle_degrees, radius),
        end_point = sb_rotate_point_about(
            sb_pose_point(start_pose),
            center,
            angle_degrees
        )
    )
    start_pose_spec(
        x = sb_point_x(end_point),
        y = sb_point_y(end_point),
        heading_degrees =
            pose_heading_degrees(start_pose) + angle_degrees
    );

function sb_arc_length(radius, angle_degrees) =
    radius * abs(sb_degrees_to_radians(angle_degrees));

function sb_list_sum(values, index = 0, accumulated = 0) =
    index >= len(values)
        ? accumulated
        : sb_list_sum(values, index + 1, accumulated + values[index]);

function sb_bounds_min_x(bounds) = bounds[0];
function sb_bounds_min_y(bounds) = bounds[1];
function sb_bounds_max_x(bounds) = bounds[2];
function sb_bounds_max_y(bounds) = bounds[3];
function sb_bounds_width(bounds) =
    sb_bounds_max_x(bounds) - sb_bounds_min_x(bounds);
function sb_bounds_height(bounds) =
    sb_bounds_max_y(bounds) - sb_bounds_min_y(bounds);
// file: ../lib/lookup.scad
//////////////////////////////////////////////////////////////////////
// LibFile: lookup.scad
// Project: Strap Bender
// FileGroup: Utilities
// FileSummary: Resolves one stable record name to exactly one record.
//////////////////////////////////////////////////////////////////////

function record_name(record) =
    record[0] == STRAP_BENDER_PROJECT_RECORD
        ? project_name(record)
        : record[0] == STRAP_BENDER_SHAPE_RECORD
            ? shape_name(record)
            : undef;

function records_named(records, name) =
    [for (record = records) if (record_name(record) == name) record];

function named_record(records, name, record_kind = "record") =
    let(matches = records_named(records, name))
    assert(
        len(matches) == 1,
        str(
            "Expected exactly one ", record_kind,
            " named '", name, "'; found ", len(matches), "."
        )
    )
    matches[0];

function record_names(records) = [for (record = records) record_name(record)];
// file: ../lib/accessors.scad
//////////////////////////////////////////////////////////////////////
// LibFile: accessors.scad
// Project: Strap Bender
// FileGroup: Data Model
// FileSummary: Named accessors for native Strap Bender records.
//////////////////////////////////////////////////////////////////////

function project_name(project) = project[PR_NAME];
function project_kind(project) = project[PR_KIND];
function project_status(project) = project[PR_STATUS];
function project_notes(project) = project[PR_NOTES];

function pose_x(pose) = pose[PO_X];
function pose_y(pose) = pose[PO_Y];
function pose_heading_degrees(pose) = pose[PO_HEADING_DEGREES];

function command_kind(command) = command[CM_KIND];
function command_source_index(command) = command[CM_SOURCE_INDEX];
function command_distance(command) = command[CM_DISTANCE];
function command_angle_degrees(command) = command[CM_ANGLE_DEGREES];
function command_inside_radius(command) = command[CM_INSIDE_RADIUS];
function command_label(command) = command[CM_LABEL];

function shape_name(shape) = shape[SH_NAME];
function shape_closure(shape) = shape[SH_CLOSURE];
function shape_start_pose(shape) = shape[SH_START_POSE];
function shape_authoring_kind(shape) = shape[SH_AUTHORING_KIND];
function shape_commands(shape) = shape[SH_COMMANDS];
function shape_notes(shape) = shape[SH_NOTES];

function primitive_kind(primitive) = primitive[AP_KIND];
function primitive_source_index(primitive) = primitive[AP_SOURCE_INDEX];
function primitive_label(primitive) = primitive[AP_LABEL];
function primitive_start_pose(primitive) = primitive[AP_START_POSE];
function primitive_end_pose(primitive) = primitive[AP_END_POSE];
function primitive_station_start(primitive) = primitive[AP_STATION_START];
function primitive_station_end(primitive) = primitive[AP_STATION_END];
function primitive_center(primitive) = primitive[AP_CENTER];
function primitive_angle_degrees(primitive) =
    primitive[AP_ANGLE_DEGREES];
function primitive_inside_radius(primitive) = primitive[AP_INSIDE_RADIUS];
function primitive_length(primitive) =
    primitive_station_end(primitive) - primitive_station_start(primitive);

function analytical_path_name(path) = path[PA_NAME];
function analytical_path_reference_axis(path) = path[PA_REFERENCE_AXIS];
function analytical_path_closure(path) = path[PA_CLOSURE];
function analytical_path_start_pose(path) = path[PA_START_POSE];
function analytical_path_end_pose(path) = path[PA_END_POSE];
function analytical_path_primitives(path) = path[PA_PRIMITIVES];
function analytical_path_bounds(path) = path[PA_BOUNDS];
function analytical_path_notes(path) = path[PA_NOTES];
function analytical_path_length(path) =
    len(analytical_path_primitives(path)) == 0
        ? 0
        : primitive_station_end(
            analytical_path_primitives(path)[
                len(analytical_path_primitives(path)) - 1
            ]
        );

function sampled_path_name(path) = path[SP_NAME];
function sampled_path_reference_axis(path) = path[SP_REFERENCE_AXIS];
function sampled_path_closure(path) = path[SP_CLOSURE];
function sampled_path_points(path) = path[SP_POINTS];
function sampled_path_chord_error_mm(path) = path[SP_CHORD_ERROR_MM];
function sampled_path_max_angle_step_degrees(path) =
    path[SP_MAX_ANGLE_STEP_DEGREES];
function sampled_path_notes(path) = path[SP_NOTES];
// file: ../lib/schema.scad
//////////////////////////////////////////////////////////////////////
// LibFile: schema.scad
// Project: Strap Bender
// FileGroup: Data Model
// FileSummary: Constructor functions for native Strap Bender records.
//////////////////////////////////////////////////////////////////////

STRAP_BENDER_PROJECT_RECORD = "strap_bender_project";
STRAP_BENDER_POSE_RECORD = "strap_bender_pose";
STRAP_BENDER_COMMAND_RECORD = "strap_bender_command";
STRAP_BENDER_SHAPE_RECORD = "strap_bender_shape";
STRAP_BENDER_ANALYTICAL_PRIMITIVE_RECORD =
    "strap_bender_analytical_primitive";
STRAP_BENDER_ANALYTICAL_PATH_RECORD = "strap_bender_analytical_path";
STRAP_BENDER_SAMPLED_PATH_RECORD = "strap_bender_sampled_path";

function project_spec(
    name,
    kind,
    status = "stub",
    notes = "",
    schema_version = STRAP_BENDER_SCHEMA_VERSION
) = [
    STRAP_BENDER_PROJECT_RECORD,
    schema_version,
    name,
    kind,
    status,
    notes
];

function start_pose_spec(
    x = 0,
    y = 0,
    heading_degrees = 0,
    schema_version = STRAP_BENDER_SCHEMA_VERSION
) = [
    STRAP_BENDER_POSE_RECORD,
    schema_version,
    x,
    y,
    heading_degrees
];

function straight_command(
    source_index,
    distance,
    label = "",
    schema_version = STRAP_BENDER_SCHEMA_VERSION
) = [
    STRAP_BENDER_COMMAND_RECORD,
    schema_version,
    "straight",
    source_index,
    distance,
    undef,
    undef,
    label
];

function bend_command(
    source_index,
    angle_degrees,
    inside_radius,
    label = "",
    schema_version = STRAP_BENDER_SCHEMA_VERSION
) = [
    STRAP_BENDER_COMMAND_RECORD,
    schema_version,
    "bend",
    source_index,
    undef,
    angle_degrees,
    inside_radius,
    label
];

function bend_program_shape_spec(
    name,
    commands,
    closure = "open",
    start_pose = start_pose_spec(),
    notes = "",
    schema_version = STRAP_BENDER_SCHEMA_VERSION
) = [
    STRAP_BENDER_SHAPE_RECORD,
    schema_version,
    name,
    closure,
    start_pose,
    "bend_program",
    commands,
    notes
];

function analytical_line_primitive(
    source_index,
    label,
    start_pose,
    end_pose,
    station_start,
    station_end,
    schema_version = STRAP_BENDER_SCHEMA_VERSION
) = [
    STRAP_BENDER_ANALYTICAL_PRIMITIVE_RECORD,
    schema_version,
    "line",
    source_index,
    label,
    start_pose,
    end_pose,
    station_start,
    station_end,
    undef,
    undef,
    undef
];

function analytical_arc_primitive(
    source_index,
    label,
    start_pose,
    end_pose,
    station_start,
    station_end,
    center,
    angle_degrees,
    inside_radius,
    schema_version = STRAP_BENDER_SCHEMA_VERSION
) = [
    STRAP_BENDER_ANALYTICAL_PRIMITIVE_RECORD,
    schema_version,
    "arc",
    source_index,
    label,
    start_pose,
    end_pose,
    station_start,
    station_end,
    center,
    angle_degrees,
    inside_radius
];

function analytical_path_spec(
    name,
    reference_axis,
    closure,
    start_pose,
    end_pose,
    primitives,
    bounds,
    notes = "",
    schema_version = STRAP_BENDER_SCHEMA_VERSION
) = [
    STRAP_BENDER_ANALYTICAL_PATH_RECORD,
    schema_version,
    name,
    reference_axis,
    closure,
    start_pose,
    end_pose,
    primitives,
    bounds,
    notes
];

function sampled_path_spec(
    name,
    reference_axis,
    closure,
    points,
    chord_error_mm,
    max_angle_step_degrees,
    notes = "",
    schema_version = STRAP_BENDER_SCHEMA_VERSION
) = [
    STRAP_BENDER_SAMPLED_PATH_RECORD,
    schema_version,
    name,
    reference_axis,
    closure,
    points,
    chord_error_mm,
    max_angle_step_degrees,
    notes
];
// file: ../lib/indices.scad
//////////////////////////////////////////////////////////////////////
// LibFile: indices.scad
// Project: Strap Bender
// FileGroup: Data Model
// FileSummary: Named indexes for native Strap Bender record vectors.
//////////////////////////////////////////////////////////////////////

// Project specification
PR_RECORD_TYPE = 0;
PR_SCHEMA_VERSION = 1;
PR_NAME = 2;
PR_KIND = 3;
PR_STATUS = 4;
PR_NOTES = 5;

// Start pose specification
PO_RECORD_TYPE = 0;
PO_SCHEMA_VERSION = 1;
PO_X = 2;
PO_Y = 3;
PO_HEADING_DEGREES = 4;

// Bend-program command
CM_RECORD_TYPE = 0;
CM_SCHEMA_VERSION = 1;
CM_KIND = 2;
CM_SOURCE_INDEX = 3;
CM_DISTANCE = 4;
CM_ANGLE_DEGREES = 5;
CM_INSIDE_RADIUS = 6;
CM_LABEL = 7;

// Shape specification
SH_RECORD_TYPE = 0;
SH_SCHEMA_VERSION = 1;
SH_NAME = 2;
SH_CLOSURE = 3;
SH_START_POSE = 4;
SH_AUTHORING_KIND = 5;
SH_COMMANDS = 6;
SH_NOTES = 7;

// Derived analytical primitive
AP_RECORD_TYPE = 0;
AP_SCHEMA_VERSION = 1;
AP_KIND = 2;
AP_SOURCE_INDEX = 3;
AP_LABEL = 4;
AP_START_POSE = 5;
AP_END_POSE = 6;
AP_STATION_START = 7;
AP_STATION_END = 8;
AP_CENTER = 9;
AP_ANGLE_DEGREES = 10;
AP_INSIDE_RADIUS = 11;

// Derived analytical path
PA_RECORD_TYPE = 0;
PA_SCHEMA_VERSION = 1;
PA_NAME = 2;
PA_REFERENCE_AXIS = 3;
PA_CLOSURE = 4;
PA_START_POSE = 5;
PA_END_POSE = 6;
PA_PRIMITIVES = 7;
PA_BOUNDS = 8;
PA_NOTES = 9;

// Derived sampled display path
SP_RECORD_TYPE = 0;
SP_SCHEMA_VERSION = 1;
SP_NAME = 2;
SP_REFERENCE_AXIS = 3;
SP_CLOSURE = 4;
SP_POINTS = 5;
SP_CHORD_ERROR_MM = 6;
SP_MAX_ANGLE_STEP_DEGREES = 7;
SP_NOTES = 8;
// file: ../strap_bender.scad
//////////////////////////////////////////////////////////////////////
// LibFile: strap_bender.scad
// Project: Strap Bender
// FileGroup: Public Foundation
// FileSummary: Loads records, analytical paths, sampling, and diagnostics.
//////////////////////////////////////////////////////////////////////

STRAP_BENDER_API_VERSION = 1;
STRAP_BENDER_SCHEMA_VERSION = 1;
STRAP_BENDER_SCAFFOLD_VERSION = 1;
STRAP_BENDER_BEND_PROGRAM_CONTRACT_VERSION = 1;
STRAP_BENDER_ANALYTICAL_PATH_CONTRACT_VERSION = 1;
STRAP_BENDER_SAMPLED_PATH_CONTRACT_VERSION = 1;

include <lib/indices.scad>
include <lib/schema.scad>
include <lib/accessors.scad>
include <lib/lookup.scad>
include <paths/analytical_math.scad>
include <paths/analytical_bounds.scad>
include <paths/compile_bend_program.scad>
include <paths/sample_analytical_path.scad>
include <lib/validation.scad>
include <lib/reporting.scad>
include <geometry/diagnostic_path.scad>
// main file
//////////////////////////////////////////////////////////////////////
// LibFile: diagnostic_render_contract.scad
// Project: Strap Bender
// FileGroup: Direct-Open F5 Contract Test
// FileSummary: Renders one closed sampled path with tangent markers.
//////////////////////////////////////////////////////////////////////

include <../strap_bender.scad>

shape = bend_program_shape_spec(
    name = "DIAGNOSTIC_RENDER_TEST",
    commands = [
        straight_command(0, 80, "S0"),
        bend_command(1, 90, 8, "B0"),
        straight_command(2, 80, "S1"),
        bend_command(3, 90, 8, "B1"),
        straight_command(4, 80, "S2"),
        bend_command(5, 90, 8, "B2"),
        straight_command(6, 80, "S3"),
        bend_command(7, 90, 8, "B3")
    ],
    closure = "closed",
    start_pose = start_pose_spec(0, 0, 0)
);

validate_bend_program_shape(shape);
analytical_path = compile_bend_program(shape);
validate_analytical_path(analytical_path);
sampled_path = sample_analytical_path(analytical_path, 0.05, 10);
validate_sampled_path(sampled_path, analytical_path);

render_diagnostic_path(
    analytical_path = analytical_path,
    sampled_path = sampled_path,
    path_width_mm = 0.8,
    path_height_mm = 0.4,
    show_tangent_points = true,
    tangent_marker_diameter_mm = 1.8
);

echo("STRAP BENDER DIAGNOSTIC RENDER CONTRACT: PASS");
